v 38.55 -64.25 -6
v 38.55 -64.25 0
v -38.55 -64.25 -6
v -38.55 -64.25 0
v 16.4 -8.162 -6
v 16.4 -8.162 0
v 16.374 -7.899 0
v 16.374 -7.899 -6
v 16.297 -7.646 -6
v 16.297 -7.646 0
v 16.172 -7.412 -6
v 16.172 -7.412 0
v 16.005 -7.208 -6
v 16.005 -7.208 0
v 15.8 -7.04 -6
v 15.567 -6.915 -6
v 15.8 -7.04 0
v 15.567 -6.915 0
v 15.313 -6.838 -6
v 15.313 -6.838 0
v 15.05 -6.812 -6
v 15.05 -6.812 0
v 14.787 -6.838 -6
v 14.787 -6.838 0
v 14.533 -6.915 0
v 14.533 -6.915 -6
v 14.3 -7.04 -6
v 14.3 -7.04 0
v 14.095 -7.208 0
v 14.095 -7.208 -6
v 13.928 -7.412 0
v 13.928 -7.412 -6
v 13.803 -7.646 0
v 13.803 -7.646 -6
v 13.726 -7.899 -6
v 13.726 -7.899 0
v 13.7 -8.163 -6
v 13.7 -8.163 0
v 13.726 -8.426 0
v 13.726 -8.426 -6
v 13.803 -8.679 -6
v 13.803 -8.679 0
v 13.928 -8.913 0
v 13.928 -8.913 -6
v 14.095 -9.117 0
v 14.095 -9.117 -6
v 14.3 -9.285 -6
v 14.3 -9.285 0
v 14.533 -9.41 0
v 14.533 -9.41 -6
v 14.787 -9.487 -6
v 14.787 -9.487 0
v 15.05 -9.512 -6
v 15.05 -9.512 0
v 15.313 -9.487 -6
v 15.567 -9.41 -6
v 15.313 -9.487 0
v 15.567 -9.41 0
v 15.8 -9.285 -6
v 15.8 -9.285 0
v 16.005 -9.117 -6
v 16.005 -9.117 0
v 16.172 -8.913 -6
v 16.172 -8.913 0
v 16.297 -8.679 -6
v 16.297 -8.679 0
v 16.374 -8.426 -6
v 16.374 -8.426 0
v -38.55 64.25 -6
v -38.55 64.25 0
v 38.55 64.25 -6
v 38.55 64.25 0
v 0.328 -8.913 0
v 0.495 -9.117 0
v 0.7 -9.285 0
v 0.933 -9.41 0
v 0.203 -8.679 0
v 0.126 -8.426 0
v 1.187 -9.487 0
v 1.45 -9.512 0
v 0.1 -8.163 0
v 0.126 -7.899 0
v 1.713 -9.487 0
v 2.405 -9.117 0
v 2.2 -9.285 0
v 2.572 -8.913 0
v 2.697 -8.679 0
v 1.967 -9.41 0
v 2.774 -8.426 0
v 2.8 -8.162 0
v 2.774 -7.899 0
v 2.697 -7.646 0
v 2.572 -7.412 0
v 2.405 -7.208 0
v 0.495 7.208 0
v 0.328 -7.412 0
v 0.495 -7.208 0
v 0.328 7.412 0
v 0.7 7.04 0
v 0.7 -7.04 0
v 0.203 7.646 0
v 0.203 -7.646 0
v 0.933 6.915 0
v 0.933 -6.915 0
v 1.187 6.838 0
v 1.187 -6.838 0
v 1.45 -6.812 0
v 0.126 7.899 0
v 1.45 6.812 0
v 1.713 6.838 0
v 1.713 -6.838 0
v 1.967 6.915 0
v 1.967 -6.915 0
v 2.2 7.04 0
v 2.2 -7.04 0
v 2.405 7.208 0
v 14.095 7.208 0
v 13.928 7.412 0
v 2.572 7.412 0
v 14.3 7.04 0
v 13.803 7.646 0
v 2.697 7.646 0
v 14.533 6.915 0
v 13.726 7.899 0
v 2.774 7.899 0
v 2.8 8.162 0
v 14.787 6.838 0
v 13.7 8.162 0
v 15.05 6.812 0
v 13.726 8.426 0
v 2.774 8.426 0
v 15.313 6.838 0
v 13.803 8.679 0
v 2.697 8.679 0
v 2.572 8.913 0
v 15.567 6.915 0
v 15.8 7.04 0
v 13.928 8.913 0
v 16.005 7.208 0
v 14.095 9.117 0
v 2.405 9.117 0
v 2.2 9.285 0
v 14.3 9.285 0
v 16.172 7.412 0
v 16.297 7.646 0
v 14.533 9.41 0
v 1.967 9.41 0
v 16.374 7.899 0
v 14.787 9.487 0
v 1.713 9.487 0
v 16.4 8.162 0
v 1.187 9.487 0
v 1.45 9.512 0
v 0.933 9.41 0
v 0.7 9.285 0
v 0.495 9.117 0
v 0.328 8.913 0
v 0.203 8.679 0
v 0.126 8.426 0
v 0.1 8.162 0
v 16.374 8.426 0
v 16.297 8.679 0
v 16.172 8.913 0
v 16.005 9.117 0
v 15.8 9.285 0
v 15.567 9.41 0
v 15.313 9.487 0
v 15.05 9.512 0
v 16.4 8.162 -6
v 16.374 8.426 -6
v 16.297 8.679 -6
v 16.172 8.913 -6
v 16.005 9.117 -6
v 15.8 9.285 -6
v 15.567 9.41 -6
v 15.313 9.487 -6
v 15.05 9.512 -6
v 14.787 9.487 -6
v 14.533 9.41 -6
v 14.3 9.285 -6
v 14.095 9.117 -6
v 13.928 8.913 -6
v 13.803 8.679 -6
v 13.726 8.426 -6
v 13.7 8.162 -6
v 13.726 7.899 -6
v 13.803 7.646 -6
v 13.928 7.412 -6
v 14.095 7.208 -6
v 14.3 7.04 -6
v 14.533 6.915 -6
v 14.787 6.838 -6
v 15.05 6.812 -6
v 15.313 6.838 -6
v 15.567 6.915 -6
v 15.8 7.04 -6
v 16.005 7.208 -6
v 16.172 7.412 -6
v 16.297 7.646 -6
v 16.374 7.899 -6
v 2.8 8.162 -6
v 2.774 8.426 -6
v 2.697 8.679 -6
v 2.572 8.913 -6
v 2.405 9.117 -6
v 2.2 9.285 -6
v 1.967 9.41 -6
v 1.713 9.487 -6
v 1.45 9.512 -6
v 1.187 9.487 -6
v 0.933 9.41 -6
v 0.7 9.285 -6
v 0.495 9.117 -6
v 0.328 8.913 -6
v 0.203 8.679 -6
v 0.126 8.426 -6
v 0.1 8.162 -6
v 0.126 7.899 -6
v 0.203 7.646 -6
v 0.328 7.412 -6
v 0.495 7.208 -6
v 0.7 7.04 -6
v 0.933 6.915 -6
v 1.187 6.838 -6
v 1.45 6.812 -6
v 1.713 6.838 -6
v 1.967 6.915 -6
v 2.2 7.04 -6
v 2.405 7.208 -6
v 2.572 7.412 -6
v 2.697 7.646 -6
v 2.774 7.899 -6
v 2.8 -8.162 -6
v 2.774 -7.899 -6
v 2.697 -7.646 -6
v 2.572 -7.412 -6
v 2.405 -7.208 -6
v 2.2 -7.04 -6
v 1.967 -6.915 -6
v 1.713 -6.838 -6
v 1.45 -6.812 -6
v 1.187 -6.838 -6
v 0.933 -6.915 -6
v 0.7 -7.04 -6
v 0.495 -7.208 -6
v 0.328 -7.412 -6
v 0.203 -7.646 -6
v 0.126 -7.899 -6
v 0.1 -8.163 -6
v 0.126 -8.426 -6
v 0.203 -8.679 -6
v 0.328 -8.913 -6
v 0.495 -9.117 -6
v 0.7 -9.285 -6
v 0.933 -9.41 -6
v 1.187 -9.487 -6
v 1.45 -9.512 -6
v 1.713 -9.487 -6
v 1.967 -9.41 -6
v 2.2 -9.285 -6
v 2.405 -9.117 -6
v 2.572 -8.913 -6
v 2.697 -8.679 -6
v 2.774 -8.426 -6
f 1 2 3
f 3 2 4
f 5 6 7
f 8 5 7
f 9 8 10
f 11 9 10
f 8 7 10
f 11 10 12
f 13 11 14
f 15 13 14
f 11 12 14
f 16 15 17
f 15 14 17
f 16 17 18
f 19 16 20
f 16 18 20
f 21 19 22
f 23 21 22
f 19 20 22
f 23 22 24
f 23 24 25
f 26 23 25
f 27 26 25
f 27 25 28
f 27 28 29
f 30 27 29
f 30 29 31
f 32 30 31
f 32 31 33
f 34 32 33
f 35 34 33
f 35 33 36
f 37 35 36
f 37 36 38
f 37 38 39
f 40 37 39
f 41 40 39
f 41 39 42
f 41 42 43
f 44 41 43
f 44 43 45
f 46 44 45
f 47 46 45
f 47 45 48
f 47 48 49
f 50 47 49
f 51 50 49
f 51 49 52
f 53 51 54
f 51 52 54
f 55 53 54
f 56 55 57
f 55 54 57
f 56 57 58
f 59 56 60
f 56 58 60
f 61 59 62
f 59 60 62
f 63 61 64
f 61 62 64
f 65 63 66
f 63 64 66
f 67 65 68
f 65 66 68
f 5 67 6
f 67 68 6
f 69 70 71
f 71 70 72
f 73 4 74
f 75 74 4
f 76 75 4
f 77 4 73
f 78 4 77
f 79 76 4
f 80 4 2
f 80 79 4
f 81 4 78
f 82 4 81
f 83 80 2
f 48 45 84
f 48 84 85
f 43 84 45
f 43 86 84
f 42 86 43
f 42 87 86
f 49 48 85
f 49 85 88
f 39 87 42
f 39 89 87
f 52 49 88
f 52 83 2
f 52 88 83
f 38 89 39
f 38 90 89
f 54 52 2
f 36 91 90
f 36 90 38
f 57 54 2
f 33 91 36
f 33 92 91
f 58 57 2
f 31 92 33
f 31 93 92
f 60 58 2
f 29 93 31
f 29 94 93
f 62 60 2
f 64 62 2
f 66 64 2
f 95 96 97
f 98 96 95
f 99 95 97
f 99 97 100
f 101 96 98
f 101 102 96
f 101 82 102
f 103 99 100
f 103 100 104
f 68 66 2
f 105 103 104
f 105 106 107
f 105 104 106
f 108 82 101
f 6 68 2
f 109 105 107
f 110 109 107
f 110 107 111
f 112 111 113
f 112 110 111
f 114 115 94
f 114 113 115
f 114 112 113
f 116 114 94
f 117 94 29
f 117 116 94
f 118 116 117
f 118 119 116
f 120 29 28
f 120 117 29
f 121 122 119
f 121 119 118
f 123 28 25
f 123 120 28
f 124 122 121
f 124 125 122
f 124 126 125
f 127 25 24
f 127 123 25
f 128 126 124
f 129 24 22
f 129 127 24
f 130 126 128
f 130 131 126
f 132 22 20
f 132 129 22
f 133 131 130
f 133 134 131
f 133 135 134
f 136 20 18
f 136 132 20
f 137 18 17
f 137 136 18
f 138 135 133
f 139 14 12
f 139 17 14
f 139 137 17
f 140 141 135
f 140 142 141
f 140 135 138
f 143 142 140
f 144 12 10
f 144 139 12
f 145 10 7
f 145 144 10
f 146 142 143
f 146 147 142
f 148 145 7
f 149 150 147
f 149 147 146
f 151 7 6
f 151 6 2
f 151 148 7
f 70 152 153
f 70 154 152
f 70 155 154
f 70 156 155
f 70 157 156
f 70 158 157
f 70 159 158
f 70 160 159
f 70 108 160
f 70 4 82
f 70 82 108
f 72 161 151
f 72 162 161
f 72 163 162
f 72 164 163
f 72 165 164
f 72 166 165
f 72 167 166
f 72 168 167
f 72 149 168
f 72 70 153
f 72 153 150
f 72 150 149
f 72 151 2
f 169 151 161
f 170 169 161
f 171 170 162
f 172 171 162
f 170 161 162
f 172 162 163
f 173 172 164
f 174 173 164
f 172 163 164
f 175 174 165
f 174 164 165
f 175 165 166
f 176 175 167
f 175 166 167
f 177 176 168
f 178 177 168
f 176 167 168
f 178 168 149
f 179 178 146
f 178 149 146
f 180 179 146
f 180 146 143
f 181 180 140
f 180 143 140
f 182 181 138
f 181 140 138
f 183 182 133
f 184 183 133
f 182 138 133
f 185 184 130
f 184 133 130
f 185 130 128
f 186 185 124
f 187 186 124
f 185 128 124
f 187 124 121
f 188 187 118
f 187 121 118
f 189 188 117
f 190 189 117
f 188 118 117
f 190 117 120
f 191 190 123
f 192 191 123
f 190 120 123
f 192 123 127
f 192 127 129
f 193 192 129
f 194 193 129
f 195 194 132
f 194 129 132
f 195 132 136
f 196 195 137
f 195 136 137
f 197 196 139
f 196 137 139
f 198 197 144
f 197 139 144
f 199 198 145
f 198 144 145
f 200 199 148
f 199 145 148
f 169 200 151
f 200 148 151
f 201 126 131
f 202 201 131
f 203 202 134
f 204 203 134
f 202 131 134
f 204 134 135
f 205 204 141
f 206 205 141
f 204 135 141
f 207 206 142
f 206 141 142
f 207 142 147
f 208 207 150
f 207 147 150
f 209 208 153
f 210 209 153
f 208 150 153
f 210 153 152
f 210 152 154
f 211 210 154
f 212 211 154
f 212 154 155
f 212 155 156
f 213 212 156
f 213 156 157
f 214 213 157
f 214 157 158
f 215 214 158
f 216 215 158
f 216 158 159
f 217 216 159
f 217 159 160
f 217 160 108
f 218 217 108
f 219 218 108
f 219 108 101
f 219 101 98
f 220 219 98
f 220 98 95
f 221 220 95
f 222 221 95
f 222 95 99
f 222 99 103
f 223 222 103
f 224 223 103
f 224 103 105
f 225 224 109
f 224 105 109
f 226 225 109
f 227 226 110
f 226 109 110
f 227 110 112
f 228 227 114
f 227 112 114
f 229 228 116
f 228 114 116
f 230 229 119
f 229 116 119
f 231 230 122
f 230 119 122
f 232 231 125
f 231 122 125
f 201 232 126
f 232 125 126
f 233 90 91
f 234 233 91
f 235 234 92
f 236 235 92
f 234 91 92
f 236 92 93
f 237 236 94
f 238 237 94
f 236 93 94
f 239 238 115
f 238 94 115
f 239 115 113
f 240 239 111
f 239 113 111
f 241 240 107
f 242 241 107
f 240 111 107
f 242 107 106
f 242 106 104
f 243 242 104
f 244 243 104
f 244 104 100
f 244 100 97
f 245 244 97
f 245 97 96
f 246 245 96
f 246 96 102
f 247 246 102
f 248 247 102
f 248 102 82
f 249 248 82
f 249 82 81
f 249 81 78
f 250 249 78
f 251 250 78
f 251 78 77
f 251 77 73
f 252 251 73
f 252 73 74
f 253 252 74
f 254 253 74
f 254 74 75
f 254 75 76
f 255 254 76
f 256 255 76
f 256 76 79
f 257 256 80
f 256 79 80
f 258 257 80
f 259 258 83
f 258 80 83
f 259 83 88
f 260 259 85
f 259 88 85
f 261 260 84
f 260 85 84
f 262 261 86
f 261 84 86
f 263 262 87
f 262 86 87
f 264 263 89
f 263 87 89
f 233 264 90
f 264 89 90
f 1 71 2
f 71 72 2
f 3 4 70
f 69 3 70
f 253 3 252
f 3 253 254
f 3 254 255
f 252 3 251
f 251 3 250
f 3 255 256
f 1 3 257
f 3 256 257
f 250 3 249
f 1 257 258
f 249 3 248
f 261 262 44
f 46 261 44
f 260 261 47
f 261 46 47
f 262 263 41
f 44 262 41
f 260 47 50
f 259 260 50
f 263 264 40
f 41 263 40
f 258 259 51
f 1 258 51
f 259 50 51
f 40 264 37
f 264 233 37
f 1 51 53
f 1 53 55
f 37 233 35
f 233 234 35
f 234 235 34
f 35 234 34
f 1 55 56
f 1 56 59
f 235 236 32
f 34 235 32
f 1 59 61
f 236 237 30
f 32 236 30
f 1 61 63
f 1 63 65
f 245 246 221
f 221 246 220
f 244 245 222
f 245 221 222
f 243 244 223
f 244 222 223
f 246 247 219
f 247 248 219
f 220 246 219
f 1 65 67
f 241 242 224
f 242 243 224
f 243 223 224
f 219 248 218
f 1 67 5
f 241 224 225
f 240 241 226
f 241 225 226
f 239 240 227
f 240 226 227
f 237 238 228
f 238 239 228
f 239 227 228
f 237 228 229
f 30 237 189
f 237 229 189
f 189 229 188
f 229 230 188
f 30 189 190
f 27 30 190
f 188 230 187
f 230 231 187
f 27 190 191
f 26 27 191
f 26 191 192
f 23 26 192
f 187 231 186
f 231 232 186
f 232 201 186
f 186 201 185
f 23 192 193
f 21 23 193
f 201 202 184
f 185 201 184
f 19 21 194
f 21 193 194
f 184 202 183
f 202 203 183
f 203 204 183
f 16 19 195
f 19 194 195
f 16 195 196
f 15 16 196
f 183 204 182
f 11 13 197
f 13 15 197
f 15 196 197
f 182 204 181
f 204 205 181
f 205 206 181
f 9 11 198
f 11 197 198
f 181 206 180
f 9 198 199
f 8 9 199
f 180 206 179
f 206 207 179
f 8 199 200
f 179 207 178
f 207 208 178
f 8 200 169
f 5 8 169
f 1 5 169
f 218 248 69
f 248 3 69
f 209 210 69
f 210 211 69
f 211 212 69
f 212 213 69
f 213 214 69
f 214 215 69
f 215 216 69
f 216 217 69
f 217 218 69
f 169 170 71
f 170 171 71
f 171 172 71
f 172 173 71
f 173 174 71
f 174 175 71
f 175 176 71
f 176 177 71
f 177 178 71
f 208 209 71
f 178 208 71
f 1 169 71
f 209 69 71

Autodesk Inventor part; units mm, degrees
ref_plane "YZ Plane" through (0, 0, 0) normal (1, 0, 0) x (0, 1, 0)
ref_plane "XZ Plane" through (0, 0, 0) normal (0, 1, 0) x (-1, 0, 0)
ref_plane "XY Plane" through (0, 0, 0) normal (0, 0, 1) x (1, 0, 0)
sketch "스케치1" plane through (0, 0, 0) normal (0, 0, 1) x (1, 0, 0)
  circle A0 centre (15.05, -8.1625) radius 1.35 projected
  circle A1 centre (1.45, -8.1625) radius 1.35 projected
  circle A2 centre (15.05, 8.1625) radius 1.35 projected
  circle A3 centre (1.45, 8.1625) radius 1.35 projected
  line L0 (38.55, -64.25) -> (-38.55, -64.25) projected
  line L1 (38.55, 64.25) -> (38.55, -64.25) projected
  line L2 (-38.55, 64.25) -> (38.55, 64.25) projected
  line L3 (-38.55, -64.25) -> (-38.55, 64.25) projected
  point P0 (0, 0)
extrude "돌출1" add sketch "스케치1" against normal blind 6
properties part number "foot" material "PMMA 플라스틱"
